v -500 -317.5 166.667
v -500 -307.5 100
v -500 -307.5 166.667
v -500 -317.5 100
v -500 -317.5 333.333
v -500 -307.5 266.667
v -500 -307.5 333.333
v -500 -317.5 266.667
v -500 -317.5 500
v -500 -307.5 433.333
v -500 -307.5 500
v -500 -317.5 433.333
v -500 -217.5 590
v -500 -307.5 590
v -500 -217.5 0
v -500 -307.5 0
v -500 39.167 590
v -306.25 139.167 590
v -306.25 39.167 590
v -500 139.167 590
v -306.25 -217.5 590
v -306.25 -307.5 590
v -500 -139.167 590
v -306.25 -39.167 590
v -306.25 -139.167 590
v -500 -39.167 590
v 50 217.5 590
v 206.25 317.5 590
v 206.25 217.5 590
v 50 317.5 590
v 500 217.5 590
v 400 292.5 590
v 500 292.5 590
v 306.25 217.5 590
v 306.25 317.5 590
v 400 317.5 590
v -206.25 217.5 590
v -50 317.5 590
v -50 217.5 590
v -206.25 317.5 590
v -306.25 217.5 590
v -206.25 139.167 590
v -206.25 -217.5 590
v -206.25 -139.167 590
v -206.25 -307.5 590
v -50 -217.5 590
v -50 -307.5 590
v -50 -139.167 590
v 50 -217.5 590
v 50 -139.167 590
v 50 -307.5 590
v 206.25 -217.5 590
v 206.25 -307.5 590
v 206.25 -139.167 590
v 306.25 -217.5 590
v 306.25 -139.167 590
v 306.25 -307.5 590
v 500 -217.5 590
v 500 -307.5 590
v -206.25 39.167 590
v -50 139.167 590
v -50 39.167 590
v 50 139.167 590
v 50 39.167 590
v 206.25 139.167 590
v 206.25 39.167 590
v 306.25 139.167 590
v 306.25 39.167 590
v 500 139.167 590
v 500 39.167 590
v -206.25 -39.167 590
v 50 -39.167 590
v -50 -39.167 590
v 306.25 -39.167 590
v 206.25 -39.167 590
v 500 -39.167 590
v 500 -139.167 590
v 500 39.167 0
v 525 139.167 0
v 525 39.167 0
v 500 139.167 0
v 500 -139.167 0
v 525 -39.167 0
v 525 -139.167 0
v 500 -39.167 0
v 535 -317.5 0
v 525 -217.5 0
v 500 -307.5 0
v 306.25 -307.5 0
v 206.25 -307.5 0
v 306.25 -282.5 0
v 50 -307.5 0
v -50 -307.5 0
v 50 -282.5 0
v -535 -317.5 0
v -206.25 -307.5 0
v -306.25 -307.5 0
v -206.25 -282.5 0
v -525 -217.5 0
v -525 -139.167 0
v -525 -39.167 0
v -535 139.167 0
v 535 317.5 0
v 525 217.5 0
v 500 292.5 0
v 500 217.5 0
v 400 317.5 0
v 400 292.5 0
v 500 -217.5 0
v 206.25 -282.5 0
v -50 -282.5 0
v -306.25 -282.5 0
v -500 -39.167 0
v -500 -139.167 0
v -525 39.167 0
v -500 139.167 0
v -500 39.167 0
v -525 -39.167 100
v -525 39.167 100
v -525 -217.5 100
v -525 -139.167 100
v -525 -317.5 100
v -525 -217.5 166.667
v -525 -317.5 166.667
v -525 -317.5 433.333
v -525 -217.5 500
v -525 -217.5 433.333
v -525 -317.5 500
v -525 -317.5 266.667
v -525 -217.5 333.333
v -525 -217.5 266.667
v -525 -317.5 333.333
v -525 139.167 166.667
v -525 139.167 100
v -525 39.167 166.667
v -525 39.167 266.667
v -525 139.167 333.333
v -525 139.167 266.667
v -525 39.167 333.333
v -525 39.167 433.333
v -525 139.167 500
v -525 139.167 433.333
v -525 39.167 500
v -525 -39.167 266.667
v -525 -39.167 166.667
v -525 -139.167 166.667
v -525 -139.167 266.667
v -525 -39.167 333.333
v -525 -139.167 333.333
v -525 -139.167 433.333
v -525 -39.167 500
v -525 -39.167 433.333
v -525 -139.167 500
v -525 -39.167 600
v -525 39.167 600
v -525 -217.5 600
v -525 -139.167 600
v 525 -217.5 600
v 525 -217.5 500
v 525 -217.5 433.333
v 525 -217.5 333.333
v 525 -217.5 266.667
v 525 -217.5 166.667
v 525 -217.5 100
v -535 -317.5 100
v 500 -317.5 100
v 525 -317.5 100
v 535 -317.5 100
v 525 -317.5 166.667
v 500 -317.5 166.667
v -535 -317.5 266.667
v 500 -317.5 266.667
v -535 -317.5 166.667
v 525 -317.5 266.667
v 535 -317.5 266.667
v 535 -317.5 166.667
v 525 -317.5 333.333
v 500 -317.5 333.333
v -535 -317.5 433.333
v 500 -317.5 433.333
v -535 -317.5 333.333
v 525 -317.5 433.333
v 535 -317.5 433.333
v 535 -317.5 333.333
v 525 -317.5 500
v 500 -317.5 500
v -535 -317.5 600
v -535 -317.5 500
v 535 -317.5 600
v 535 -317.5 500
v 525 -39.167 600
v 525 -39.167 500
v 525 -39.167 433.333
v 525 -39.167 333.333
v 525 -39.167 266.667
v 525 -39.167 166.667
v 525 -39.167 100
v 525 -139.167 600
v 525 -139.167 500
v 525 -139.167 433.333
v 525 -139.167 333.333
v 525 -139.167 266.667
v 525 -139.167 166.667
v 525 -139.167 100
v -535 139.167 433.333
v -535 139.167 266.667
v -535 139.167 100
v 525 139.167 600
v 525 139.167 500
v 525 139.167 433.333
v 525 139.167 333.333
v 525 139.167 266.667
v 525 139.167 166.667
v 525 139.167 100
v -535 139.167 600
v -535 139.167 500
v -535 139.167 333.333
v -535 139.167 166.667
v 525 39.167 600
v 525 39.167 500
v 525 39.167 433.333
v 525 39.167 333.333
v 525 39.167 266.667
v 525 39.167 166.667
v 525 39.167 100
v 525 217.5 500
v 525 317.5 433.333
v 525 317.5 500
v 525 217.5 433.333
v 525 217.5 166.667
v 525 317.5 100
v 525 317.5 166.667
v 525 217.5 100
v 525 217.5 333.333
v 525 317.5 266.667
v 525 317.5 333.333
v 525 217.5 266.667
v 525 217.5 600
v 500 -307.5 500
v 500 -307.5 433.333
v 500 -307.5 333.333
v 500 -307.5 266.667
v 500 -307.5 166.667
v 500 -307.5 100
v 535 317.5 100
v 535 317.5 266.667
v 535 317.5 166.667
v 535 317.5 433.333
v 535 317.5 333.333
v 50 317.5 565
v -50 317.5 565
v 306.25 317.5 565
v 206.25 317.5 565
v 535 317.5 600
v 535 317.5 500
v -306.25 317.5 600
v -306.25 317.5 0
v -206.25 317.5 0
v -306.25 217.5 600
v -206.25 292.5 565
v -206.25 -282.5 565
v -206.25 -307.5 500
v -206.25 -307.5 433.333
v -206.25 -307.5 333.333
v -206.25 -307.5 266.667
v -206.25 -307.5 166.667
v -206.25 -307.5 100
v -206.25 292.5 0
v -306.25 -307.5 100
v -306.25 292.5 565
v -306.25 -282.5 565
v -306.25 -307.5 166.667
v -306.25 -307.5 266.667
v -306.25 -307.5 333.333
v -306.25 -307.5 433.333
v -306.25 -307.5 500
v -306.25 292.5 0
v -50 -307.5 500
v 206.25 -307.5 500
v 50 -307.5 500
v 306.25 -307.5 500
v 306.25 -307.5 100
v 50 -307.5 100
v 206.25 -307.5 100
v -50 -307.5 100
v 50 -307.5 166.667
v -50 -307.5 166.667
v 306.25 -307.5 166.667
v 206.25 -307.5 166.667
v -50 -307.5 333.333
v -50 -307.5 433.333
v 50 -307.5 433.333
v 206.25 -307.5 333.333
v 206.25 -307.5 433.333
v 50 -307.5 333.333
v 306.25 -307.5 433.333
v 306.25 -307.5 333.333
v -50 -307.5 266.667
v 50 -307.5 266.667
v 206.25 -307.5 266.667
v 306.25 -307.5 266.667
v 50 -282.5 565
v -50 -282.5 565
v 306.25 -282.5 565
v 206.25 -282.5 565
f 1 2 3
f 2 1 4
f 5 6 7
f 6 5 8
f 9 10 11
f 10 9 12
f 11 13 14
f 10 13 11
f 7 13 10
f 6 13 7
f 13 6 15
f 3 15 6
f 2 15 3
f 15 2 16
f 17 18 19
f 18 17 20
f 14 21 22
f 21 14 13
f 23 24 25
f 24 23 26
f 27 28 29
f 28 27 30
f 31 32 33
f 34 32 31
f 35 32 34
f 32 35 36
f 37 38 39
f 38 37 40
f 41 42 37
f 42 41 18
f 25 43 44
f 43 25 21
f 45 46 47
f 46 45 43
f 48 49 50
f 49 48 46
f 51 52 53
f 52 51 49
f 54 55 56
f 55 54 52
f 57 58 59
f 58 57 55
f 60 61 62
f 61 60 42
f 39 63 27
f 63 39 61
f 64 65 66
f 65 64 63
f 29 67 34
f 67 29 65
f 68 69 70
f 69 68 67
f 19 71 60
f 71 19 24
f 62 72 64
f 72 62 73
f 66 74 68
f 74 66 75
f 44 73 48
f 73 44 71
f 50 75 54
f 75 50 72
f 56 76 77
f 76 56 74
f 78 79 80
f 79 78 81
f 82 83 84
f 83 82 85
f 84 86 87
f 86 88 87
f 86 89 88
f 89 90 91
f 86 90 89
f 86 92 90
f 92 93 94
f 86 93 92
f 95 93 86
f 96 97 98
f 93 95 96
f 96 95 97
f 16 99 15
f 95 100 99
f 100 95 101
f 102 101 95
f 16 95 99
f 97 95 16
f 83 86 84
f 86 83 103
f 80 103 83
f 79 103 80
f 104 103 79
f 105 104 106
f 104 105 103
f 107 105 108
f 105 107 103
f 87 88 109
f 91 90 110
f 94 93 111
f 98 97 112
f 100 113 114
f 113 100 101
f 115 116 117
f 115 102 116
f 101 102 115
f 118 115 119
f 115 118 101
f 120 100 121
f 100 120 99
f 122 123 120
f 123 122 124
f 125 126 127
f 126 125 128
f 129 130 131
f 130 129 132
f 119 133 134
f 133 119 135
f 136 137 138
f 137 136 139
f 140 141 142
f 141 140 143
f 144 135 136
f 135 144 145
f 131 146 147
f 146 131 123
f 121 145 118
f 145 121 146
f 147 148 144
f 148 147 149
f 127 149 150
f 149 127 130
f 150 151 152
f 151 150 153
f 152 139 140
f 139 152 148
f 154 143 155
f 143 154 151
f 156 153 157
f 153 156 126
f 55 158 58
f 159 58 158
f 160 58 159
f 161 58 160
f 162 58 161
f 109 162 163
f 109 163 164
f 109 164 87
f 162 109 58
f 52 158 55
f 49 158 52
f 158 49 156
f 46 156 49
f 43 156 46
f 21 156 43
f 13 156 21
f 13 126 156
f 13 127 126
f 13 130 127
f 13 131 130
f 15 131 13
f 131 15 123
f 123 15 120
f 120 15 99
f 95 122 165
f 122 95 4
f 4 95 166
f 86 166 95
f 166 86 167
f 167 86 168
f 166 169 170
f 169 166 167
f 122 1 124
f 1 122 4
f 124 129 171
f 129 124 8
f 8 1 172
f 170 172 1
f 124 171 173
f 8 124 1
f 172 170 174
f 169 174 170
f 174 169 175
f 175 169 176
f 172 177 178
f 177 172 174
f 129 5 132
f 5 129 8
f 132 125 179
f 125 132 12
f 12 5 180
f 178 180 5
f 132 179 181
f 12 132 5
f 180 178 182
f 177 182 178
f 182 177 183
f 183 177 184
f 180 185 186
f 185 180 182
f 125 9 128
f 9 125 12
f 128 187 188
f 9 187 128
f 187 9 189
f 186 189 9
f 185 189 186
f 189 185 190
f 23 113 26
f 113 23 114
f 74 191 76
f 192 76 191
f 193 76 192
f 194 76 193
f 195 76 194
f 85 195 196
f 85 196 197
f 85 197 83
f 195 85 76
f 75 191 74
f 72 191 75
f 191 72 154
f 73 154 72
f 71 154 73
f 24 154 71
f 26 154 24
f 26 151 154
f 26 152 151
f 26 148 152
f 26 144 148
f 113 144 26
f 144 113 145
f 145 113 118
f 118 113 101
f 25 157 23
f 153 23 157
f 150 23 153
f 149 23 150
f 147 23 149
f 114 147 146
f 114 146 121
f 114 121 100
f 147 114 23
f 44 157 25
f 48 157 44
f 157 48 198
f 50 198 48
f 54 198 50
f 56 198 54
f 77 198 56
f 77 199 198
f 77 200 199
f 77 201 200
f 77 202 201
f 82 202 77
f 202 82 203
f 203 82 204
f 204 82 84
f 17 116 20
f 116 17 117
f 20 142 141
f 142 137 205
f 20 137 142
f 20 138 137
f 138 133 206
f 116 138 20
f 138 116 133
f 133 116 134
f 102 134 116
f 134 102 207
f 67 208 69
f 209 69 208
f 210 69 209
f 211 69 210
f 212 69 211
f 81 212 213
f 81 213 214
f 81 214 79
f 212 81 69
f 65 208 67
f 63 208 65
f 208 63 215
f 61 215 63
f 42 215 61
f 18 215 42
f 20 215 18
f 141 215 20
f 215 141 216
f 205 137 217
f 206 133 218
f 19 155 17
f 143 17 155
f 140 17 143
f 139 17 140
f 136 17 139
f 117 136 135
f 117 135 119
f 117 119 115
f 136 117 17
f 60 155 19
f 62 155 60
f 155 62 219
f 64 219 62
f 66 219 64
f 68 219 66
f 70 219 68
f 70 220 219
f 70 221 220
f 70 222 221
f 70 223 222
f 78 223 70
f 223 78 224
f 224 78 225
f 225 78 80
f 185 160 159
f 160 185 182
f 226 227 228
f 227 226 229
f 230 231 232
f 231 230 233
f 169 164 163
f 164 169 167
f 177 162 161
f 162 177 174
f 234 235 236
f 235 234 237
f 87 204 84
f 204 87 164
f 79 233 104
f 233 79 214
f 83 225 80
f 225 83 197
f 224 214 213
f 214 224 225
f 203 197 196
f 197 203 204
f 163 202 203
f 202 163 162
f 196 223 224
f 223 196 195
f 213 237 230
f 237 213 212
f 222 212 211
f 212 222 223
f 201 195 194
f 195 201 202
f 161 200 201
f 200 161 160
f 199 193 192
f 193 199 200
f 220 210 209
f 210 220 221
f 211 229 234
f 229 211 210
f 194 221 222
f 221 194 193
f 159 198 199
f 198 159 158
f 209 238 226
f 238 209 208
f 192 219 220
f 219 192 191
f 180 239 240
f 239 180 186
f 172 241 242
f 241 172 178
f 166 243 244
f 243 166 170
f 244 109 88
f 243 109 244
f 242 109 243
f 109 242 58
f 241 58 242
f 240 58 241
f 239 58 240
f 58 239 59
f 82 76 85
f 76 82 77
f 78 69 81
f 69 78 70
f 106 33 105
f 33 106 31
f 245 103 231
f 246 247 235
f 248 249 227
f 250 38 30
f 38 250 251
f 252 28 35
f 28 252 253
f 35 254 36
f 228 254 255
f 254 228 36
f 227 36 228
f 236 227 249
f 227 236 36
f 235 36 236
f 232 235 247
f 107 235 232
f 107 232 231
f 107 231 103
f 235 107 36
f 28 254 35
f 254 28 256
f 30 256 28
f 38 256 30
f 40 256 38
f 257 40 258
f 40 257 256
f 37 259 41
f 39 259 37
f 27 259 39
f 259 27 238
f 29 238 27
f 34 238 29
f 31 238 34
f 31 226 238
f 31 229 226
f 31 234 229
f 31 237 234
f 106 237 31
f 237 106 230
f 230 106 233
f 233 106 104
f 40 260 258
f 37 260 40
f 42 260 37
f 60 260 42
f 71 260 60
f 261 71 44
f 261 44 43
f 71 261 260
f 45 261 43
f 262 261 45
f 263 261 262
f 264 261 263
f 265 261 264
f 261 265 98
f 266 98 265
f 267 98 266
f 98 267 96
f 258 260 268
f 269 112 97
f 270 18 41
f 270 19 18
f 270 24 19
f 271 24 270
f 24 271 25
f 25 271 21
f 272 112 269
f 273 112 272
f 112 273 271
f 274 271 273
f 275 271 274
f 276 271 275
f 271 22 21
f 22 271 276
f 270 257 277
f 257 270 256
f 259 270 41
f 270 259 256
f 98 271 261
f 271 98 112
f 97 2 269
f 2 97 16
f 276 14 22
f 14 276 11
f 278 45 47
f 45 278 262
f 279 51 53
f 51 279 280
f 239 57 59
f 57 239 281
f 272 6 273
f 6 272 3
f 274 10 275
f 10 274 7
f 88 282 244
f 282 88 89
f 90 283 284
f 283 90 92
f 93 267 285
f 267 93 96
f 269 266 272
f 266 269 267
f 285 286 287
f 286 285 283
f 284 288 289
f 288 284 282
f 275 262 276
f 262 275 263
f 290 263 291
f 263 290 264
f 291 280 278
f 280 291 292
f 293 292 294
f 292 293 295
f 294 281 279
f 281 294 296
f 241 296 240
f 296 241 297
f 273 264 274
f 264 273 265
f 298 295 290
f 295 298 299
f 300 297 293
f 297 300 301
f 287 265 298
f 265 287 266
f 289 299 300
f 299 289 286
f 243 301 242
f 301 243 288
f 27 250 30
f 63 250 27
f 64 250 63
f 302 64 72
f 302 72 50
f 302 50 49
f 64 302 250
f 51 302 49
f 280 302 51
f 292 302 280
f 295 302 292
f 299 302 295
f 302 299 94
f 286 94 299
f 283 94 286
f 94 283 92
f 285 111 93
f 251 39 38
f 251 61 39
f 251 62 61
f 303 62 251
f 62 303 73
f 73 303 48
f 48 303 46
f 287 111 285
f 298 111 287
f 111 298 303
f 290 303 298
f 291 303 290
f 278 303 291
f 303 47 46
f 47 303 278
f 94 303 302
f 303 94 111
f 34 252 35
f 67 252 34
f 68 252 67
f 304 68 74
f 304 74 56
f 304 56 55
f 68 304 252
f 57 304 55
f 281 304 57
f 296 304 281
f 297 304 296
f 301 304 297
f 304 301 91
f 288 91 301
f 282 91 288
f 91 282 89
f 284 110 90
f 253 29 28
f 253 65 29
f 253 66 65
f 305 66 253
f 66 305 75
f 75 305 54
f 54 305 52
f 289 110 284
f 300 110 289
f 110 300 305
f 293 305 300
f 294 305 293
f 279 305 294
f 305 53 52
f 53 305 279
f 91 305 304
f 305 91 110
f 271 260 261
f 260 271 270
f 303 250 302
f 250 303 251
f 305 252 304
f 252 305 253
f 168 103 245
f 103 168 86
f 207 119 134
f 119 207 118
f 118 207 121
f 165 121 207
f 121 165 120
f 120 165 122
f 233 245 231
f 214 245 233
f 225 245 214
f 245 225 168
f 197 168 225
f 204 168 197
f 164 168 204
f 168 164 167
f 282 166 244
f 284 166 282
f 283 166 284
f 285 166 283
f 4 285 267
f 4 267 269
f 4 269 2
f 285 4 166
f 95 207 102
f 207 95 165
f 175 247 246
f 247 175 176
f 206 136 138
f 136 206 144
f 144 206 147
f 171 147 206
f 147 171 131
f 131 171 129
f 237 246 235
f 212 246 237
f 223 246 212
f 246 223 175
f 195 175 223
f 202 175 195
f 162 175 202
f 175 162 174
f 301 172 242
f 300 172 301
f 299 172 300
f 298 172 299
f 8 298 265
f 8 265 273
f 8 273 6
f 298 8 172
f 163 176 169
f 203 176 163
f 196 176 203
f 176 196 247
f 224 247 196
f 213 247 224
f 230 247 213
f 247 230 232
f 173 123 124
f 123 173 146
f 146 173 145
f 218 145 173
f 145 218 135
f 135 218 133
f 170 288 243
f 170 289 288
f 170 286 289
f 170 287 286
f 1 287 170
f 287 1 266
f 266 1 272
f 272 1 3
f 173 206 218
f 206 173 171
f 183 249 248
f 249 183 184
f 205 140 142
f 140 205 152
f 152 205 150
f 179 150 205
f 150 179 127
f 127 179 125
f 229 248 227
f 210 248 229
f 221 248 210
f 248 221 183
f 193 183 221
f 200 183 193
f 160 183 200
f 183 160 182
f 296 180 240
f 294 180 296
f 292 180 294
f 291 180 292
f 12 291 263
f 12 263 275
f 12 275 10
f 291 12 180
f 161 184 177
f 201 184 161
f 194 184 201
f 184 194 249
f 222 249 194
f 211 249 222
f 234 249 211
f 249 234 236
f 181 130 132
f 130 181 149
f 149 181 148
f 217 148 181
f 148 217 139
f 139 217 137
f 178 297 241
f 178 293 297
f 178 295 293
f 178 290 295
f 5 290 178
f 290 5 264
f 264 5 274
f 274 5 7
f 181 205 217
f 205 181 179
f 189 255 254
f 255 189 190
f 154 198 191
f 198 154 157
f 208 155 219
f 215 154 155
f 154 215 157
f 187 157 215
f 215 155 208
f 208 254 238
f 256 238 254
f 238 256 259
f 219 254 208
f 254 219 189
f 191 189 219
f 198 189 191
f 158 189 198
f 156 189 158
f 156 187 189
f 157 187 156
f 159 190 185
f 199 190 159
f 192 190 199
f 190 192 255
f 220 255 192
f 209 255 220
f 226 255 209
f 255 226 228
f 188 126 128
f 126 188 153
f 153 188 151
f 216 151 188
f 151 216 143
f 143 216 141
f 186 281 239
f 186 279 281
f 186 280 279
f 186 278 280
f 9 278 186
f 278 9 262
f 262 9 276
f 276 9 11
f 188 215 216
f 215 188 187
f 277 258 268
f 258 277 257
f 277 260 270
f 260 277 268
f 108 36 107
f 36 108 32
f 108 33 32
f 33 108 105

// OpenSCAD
/*
  Open-back, open-bottom box with long faces made from planks.

  Dimensions:
    Clear internal footprint inside battens:
      1000 mm wide x 500 mm deep

    Overall modeled footprint:
      1070 mm wide x 635 mm deep x 600 mm high

    Facing the box, the left side panels stop at the rear edge of the
    3rd top panel.

  Material thickness:
    10 mm

  Planks:
    - Front: 4 planks, 1070 x 100 x 10 mm, with equal gaps.
    - Left: 4 panels, 456.67 x 100 x 10 mm.
    - Right: 4 panels, 635 x 100 x 10 mm.
      with the same 66.67 mm vertical gaps as the front.
    - Top: 3 planks, 1070 x 100 x 10 mm, plus rear plank shortened
      to 841.25 x 100 x 10 mm on the left side.
    - Internal vertical structure: 100 x 25 mm battens at corners and
      front/side fixing points.
    - Back and bottom are open.

  This is intentionally still a simple box. Use it as the starting point
  before adding vents, access openings, or support framing.
*/

$fn = 24;

clear_width_inside_battens = 1000;
clear_depth_inside_battens = 500;

box_height = 600;
panel_thickness = 10;
plank_width = 100;
batten_width = 100;
batten_depth = 25;
batten_height = box_height - panel_thickness;

box_width = clear_width_inside_battens + (2 * panel_thickness) + (2 * batten_depth);
box_depth = clear_depth_inside_battens + panel_thickness + batten_depth + batten_width;

front_plank_count = 4;
front_gap = (box_height - (front_plank_count * plank_width)) / (front_plank_count - 1);
side_plank_count = 4;
side_panel_height = plank_width;
top_plank_count = 4;
top_gap = (box_depth - (top_plank_count * plank_width)) / (top_plank_count - 1);
left_side_ends_at_top_panel = 3;
left_side_depth = (left_side_ends_at_top_panel * plank_width)
  + ((left_side_ends_at_top_panel - 1) * top_gap);

left_batten_x_position = -box_width / 2 + panel_thickness + batten_depth / 2;
right_batten_x_position = box_width / 2 - panel_thickness - batten_depth / 2;
first_middle_front_batten_x = left_batten_x_position
  + ((right_batten_x_position - left_batten_x_position) / 4);
rear_top_shorten = first_middle_front_batten_x + (box_width / 2) - (batten_width / 2);

wood_color = [0.72, 0.45, 0.24];

module panel(size, position) {
  color(wood_color)
    translate(position)
      cube(size, center = true);
}

module front_batten(position) {
  color([0.55, 0.31, 0.16])
    translate(position)
      cube([batten_width, batten_depth, batten_height], center = true);
}

module side_batten(position) {
  color([0.55, 0.31, 0.16])
    translate(position)
      cube([batten_depth, batten_width, batten_height], center = true);
}

module top_cross_rail(position) {
  color([0.55, 0.31, 0.16])
    translate(position)
      cube([batten_width, box_depth, batten_depth], center = true);
}

module closed_box() {
  // Internal vertical battens.
  front_batten_y = -box_depth / 2 + panel_thickness + batten_depth / 2;
  left_batten_x = -box_width / 2 + panel_thickness + batten_depth / 2;
  right_batten_x = box_width / 2 - panel_thickness - batten_depth / 2;

  // Side battens align with the top panel centres.
  for (i = [0 : left_side_ends_at_top_panel - 1]) {
    y = -box_depth / 2 + plank_width / 2 + i * (plank_width + top_gap);
    side_batten([left_batten_x, y, batten_height / 2]);
  }

  for (i = [0 : top_plank_count - 1]) {
    y = -box_depth / 2 + plank_width / 2 + i * (plank_width + top_gap);
    side_batten([right_batten_x, y, batten_height / 2]);
  }

  // Front middle: 3 battens between the side-aligned corner battens.
  for (i = [1 : 3]) {
    x = left_batten_x + i * ((right_batten_x - left_batten_x) / 4);
    front_batten([x, front_batten_y, batten_height / 2]);
  }

  // Three rails under the top panels, aligned with the middle front battens.
  for (i = [1 : 3]) {
    x = left_batten_x + i * ((right_batten_x - left_batten_x) / 4);
    top_cross_rail([x, 0, box_height - panel_thickness - batten_depth / 2]);
  }

  // Front: 4 planks, with equal gaps between planks.
  for (i = [0 : front_plank_count - 1]) {
    z = plank_width / 2 + i * (plank_width + front_gap);

    panel(
      [box_width, panel_thickness, plank_width],
      [0, -box_depth / 2 + panel_thickness / 2, z]
    );
  }

  // Left and right: 4 panels per face, using the same vertical gap as the front.
  for (i = [0 : side_plank_count - 1]) {
    z = side_panel_height / 2 + i * (side_panel_height + front_gap);

    panel(
      [panel_thickness, left_side_depth, side_panel_height],
      [-box_width / 2 + panel_thickness / 2, -box_depth / 2 + left_side_depth / 2, z]
    );
    panel(
      [panel_thickness, box_depth, side_panel_height],
      [box_width / 2 - panel_thickness / 2, 0, z]
    );
  }

  // Top: 4 planks, with equal gaps between planks.
  for (i = [0 : top_plank_count - 1]) {
    y = -box_depth / 2 + plank_width / 2 + i * (plank_width + top_gap);
    top_length = i == top_plank_count - 1 ? box_width - rear_top_shorten : box_width;
    top_x = i == top_plank_count - 1 ? rear_top_shorten / 2 : 0;

    panel(
      [top_length, plank_width, panel_thickness],
      [top_x, y, box_height - panel_thickness / 2]
    );
  }

  // Support the new left end of the shortened rear top plank.
  rear_top_y = -box_depth / 2 + plank_width / 2 + (top_plank_count - 1) * (plank_width + top_gap);
  rear_top_back_edge_y = rear_top_y + plank_width / 2;
  rear_batten_y = rear_top_back_edge_y - batten_depth / 2;
  rear_top_left_edge_x = -box_width / 2 + rear_top_shorten;
  rear_top_left_support_x = first_middle_front_batten_x;
  rear_top_right_support_x = right_batten_x;
  front_batten([rear_top_left_support_x, rear_batten_y, batten_height / 2]);

  // Rear stabilizer aligned to the back edge of the rear top panel.
  front_batten([rear_top_right_support_x - (batten_depth + batten_width) / 2, rear_batten_y, batten_height / 2]);
}

closed_box();

/*
  Basic panel list:
    - Front: 4 x 1070 x 100 x 10 mm
      Gaps between planks: 66.67 mm
    - Left: 4 x 456.67 x 100 x 10 mm
      Gaps between panels: 66.67 mm
    - Right: 4 x 635 x 100 x 10 mm
      Gaps between panels: 66.67 mm
    - Top: 3 x 1070 x 100 x 10 mm
    - Rear top: 1 x 841.25 x 100 x 10 mm, shortened 228.75 mm on the left
      Gaps between planks: 78.33 mm
    - Internal vertical battens:
      3 middle front battens: 100 x 25 x 590 mm
      8 side/support battens: 25 x 100 x 590 mm
      3 on the shortened left side, aligned with the first 3 top panels
      4 on the right side, aligned with all 4 top panels
      2 rear battens aligned with the back edge of the rear top panel
      3 top cross rails: 100 x 25 x 635 mm, under the top panels
      and aligned with the middle front battens
    - Back: open
    - Bottom: open

  Long planks:
    - 7 panels of 1070 x 100 x 10 mm
    - 1 panel of 841.25 x 100 x 10 mm

  Total side panels:
    - 4 panels of 456.67 x 100 x 10 mm
    - 4 panels of 635 x 100 x 10 mm

  Clear inside battens:
    - Width: 1000 mm
    - Depth: 500 mm

  Structural note:
    - The front battens reduce the unsupported front plank span
      from 1000 mm to about 235 mm.
    - The left side battens are redistributed over the shorter 456.67 mm side.
    - The right side battens remain distributed over the full 635 mm side.
    - The shortened rear top plank has a direct vertical support under
      its new left end.
*/
